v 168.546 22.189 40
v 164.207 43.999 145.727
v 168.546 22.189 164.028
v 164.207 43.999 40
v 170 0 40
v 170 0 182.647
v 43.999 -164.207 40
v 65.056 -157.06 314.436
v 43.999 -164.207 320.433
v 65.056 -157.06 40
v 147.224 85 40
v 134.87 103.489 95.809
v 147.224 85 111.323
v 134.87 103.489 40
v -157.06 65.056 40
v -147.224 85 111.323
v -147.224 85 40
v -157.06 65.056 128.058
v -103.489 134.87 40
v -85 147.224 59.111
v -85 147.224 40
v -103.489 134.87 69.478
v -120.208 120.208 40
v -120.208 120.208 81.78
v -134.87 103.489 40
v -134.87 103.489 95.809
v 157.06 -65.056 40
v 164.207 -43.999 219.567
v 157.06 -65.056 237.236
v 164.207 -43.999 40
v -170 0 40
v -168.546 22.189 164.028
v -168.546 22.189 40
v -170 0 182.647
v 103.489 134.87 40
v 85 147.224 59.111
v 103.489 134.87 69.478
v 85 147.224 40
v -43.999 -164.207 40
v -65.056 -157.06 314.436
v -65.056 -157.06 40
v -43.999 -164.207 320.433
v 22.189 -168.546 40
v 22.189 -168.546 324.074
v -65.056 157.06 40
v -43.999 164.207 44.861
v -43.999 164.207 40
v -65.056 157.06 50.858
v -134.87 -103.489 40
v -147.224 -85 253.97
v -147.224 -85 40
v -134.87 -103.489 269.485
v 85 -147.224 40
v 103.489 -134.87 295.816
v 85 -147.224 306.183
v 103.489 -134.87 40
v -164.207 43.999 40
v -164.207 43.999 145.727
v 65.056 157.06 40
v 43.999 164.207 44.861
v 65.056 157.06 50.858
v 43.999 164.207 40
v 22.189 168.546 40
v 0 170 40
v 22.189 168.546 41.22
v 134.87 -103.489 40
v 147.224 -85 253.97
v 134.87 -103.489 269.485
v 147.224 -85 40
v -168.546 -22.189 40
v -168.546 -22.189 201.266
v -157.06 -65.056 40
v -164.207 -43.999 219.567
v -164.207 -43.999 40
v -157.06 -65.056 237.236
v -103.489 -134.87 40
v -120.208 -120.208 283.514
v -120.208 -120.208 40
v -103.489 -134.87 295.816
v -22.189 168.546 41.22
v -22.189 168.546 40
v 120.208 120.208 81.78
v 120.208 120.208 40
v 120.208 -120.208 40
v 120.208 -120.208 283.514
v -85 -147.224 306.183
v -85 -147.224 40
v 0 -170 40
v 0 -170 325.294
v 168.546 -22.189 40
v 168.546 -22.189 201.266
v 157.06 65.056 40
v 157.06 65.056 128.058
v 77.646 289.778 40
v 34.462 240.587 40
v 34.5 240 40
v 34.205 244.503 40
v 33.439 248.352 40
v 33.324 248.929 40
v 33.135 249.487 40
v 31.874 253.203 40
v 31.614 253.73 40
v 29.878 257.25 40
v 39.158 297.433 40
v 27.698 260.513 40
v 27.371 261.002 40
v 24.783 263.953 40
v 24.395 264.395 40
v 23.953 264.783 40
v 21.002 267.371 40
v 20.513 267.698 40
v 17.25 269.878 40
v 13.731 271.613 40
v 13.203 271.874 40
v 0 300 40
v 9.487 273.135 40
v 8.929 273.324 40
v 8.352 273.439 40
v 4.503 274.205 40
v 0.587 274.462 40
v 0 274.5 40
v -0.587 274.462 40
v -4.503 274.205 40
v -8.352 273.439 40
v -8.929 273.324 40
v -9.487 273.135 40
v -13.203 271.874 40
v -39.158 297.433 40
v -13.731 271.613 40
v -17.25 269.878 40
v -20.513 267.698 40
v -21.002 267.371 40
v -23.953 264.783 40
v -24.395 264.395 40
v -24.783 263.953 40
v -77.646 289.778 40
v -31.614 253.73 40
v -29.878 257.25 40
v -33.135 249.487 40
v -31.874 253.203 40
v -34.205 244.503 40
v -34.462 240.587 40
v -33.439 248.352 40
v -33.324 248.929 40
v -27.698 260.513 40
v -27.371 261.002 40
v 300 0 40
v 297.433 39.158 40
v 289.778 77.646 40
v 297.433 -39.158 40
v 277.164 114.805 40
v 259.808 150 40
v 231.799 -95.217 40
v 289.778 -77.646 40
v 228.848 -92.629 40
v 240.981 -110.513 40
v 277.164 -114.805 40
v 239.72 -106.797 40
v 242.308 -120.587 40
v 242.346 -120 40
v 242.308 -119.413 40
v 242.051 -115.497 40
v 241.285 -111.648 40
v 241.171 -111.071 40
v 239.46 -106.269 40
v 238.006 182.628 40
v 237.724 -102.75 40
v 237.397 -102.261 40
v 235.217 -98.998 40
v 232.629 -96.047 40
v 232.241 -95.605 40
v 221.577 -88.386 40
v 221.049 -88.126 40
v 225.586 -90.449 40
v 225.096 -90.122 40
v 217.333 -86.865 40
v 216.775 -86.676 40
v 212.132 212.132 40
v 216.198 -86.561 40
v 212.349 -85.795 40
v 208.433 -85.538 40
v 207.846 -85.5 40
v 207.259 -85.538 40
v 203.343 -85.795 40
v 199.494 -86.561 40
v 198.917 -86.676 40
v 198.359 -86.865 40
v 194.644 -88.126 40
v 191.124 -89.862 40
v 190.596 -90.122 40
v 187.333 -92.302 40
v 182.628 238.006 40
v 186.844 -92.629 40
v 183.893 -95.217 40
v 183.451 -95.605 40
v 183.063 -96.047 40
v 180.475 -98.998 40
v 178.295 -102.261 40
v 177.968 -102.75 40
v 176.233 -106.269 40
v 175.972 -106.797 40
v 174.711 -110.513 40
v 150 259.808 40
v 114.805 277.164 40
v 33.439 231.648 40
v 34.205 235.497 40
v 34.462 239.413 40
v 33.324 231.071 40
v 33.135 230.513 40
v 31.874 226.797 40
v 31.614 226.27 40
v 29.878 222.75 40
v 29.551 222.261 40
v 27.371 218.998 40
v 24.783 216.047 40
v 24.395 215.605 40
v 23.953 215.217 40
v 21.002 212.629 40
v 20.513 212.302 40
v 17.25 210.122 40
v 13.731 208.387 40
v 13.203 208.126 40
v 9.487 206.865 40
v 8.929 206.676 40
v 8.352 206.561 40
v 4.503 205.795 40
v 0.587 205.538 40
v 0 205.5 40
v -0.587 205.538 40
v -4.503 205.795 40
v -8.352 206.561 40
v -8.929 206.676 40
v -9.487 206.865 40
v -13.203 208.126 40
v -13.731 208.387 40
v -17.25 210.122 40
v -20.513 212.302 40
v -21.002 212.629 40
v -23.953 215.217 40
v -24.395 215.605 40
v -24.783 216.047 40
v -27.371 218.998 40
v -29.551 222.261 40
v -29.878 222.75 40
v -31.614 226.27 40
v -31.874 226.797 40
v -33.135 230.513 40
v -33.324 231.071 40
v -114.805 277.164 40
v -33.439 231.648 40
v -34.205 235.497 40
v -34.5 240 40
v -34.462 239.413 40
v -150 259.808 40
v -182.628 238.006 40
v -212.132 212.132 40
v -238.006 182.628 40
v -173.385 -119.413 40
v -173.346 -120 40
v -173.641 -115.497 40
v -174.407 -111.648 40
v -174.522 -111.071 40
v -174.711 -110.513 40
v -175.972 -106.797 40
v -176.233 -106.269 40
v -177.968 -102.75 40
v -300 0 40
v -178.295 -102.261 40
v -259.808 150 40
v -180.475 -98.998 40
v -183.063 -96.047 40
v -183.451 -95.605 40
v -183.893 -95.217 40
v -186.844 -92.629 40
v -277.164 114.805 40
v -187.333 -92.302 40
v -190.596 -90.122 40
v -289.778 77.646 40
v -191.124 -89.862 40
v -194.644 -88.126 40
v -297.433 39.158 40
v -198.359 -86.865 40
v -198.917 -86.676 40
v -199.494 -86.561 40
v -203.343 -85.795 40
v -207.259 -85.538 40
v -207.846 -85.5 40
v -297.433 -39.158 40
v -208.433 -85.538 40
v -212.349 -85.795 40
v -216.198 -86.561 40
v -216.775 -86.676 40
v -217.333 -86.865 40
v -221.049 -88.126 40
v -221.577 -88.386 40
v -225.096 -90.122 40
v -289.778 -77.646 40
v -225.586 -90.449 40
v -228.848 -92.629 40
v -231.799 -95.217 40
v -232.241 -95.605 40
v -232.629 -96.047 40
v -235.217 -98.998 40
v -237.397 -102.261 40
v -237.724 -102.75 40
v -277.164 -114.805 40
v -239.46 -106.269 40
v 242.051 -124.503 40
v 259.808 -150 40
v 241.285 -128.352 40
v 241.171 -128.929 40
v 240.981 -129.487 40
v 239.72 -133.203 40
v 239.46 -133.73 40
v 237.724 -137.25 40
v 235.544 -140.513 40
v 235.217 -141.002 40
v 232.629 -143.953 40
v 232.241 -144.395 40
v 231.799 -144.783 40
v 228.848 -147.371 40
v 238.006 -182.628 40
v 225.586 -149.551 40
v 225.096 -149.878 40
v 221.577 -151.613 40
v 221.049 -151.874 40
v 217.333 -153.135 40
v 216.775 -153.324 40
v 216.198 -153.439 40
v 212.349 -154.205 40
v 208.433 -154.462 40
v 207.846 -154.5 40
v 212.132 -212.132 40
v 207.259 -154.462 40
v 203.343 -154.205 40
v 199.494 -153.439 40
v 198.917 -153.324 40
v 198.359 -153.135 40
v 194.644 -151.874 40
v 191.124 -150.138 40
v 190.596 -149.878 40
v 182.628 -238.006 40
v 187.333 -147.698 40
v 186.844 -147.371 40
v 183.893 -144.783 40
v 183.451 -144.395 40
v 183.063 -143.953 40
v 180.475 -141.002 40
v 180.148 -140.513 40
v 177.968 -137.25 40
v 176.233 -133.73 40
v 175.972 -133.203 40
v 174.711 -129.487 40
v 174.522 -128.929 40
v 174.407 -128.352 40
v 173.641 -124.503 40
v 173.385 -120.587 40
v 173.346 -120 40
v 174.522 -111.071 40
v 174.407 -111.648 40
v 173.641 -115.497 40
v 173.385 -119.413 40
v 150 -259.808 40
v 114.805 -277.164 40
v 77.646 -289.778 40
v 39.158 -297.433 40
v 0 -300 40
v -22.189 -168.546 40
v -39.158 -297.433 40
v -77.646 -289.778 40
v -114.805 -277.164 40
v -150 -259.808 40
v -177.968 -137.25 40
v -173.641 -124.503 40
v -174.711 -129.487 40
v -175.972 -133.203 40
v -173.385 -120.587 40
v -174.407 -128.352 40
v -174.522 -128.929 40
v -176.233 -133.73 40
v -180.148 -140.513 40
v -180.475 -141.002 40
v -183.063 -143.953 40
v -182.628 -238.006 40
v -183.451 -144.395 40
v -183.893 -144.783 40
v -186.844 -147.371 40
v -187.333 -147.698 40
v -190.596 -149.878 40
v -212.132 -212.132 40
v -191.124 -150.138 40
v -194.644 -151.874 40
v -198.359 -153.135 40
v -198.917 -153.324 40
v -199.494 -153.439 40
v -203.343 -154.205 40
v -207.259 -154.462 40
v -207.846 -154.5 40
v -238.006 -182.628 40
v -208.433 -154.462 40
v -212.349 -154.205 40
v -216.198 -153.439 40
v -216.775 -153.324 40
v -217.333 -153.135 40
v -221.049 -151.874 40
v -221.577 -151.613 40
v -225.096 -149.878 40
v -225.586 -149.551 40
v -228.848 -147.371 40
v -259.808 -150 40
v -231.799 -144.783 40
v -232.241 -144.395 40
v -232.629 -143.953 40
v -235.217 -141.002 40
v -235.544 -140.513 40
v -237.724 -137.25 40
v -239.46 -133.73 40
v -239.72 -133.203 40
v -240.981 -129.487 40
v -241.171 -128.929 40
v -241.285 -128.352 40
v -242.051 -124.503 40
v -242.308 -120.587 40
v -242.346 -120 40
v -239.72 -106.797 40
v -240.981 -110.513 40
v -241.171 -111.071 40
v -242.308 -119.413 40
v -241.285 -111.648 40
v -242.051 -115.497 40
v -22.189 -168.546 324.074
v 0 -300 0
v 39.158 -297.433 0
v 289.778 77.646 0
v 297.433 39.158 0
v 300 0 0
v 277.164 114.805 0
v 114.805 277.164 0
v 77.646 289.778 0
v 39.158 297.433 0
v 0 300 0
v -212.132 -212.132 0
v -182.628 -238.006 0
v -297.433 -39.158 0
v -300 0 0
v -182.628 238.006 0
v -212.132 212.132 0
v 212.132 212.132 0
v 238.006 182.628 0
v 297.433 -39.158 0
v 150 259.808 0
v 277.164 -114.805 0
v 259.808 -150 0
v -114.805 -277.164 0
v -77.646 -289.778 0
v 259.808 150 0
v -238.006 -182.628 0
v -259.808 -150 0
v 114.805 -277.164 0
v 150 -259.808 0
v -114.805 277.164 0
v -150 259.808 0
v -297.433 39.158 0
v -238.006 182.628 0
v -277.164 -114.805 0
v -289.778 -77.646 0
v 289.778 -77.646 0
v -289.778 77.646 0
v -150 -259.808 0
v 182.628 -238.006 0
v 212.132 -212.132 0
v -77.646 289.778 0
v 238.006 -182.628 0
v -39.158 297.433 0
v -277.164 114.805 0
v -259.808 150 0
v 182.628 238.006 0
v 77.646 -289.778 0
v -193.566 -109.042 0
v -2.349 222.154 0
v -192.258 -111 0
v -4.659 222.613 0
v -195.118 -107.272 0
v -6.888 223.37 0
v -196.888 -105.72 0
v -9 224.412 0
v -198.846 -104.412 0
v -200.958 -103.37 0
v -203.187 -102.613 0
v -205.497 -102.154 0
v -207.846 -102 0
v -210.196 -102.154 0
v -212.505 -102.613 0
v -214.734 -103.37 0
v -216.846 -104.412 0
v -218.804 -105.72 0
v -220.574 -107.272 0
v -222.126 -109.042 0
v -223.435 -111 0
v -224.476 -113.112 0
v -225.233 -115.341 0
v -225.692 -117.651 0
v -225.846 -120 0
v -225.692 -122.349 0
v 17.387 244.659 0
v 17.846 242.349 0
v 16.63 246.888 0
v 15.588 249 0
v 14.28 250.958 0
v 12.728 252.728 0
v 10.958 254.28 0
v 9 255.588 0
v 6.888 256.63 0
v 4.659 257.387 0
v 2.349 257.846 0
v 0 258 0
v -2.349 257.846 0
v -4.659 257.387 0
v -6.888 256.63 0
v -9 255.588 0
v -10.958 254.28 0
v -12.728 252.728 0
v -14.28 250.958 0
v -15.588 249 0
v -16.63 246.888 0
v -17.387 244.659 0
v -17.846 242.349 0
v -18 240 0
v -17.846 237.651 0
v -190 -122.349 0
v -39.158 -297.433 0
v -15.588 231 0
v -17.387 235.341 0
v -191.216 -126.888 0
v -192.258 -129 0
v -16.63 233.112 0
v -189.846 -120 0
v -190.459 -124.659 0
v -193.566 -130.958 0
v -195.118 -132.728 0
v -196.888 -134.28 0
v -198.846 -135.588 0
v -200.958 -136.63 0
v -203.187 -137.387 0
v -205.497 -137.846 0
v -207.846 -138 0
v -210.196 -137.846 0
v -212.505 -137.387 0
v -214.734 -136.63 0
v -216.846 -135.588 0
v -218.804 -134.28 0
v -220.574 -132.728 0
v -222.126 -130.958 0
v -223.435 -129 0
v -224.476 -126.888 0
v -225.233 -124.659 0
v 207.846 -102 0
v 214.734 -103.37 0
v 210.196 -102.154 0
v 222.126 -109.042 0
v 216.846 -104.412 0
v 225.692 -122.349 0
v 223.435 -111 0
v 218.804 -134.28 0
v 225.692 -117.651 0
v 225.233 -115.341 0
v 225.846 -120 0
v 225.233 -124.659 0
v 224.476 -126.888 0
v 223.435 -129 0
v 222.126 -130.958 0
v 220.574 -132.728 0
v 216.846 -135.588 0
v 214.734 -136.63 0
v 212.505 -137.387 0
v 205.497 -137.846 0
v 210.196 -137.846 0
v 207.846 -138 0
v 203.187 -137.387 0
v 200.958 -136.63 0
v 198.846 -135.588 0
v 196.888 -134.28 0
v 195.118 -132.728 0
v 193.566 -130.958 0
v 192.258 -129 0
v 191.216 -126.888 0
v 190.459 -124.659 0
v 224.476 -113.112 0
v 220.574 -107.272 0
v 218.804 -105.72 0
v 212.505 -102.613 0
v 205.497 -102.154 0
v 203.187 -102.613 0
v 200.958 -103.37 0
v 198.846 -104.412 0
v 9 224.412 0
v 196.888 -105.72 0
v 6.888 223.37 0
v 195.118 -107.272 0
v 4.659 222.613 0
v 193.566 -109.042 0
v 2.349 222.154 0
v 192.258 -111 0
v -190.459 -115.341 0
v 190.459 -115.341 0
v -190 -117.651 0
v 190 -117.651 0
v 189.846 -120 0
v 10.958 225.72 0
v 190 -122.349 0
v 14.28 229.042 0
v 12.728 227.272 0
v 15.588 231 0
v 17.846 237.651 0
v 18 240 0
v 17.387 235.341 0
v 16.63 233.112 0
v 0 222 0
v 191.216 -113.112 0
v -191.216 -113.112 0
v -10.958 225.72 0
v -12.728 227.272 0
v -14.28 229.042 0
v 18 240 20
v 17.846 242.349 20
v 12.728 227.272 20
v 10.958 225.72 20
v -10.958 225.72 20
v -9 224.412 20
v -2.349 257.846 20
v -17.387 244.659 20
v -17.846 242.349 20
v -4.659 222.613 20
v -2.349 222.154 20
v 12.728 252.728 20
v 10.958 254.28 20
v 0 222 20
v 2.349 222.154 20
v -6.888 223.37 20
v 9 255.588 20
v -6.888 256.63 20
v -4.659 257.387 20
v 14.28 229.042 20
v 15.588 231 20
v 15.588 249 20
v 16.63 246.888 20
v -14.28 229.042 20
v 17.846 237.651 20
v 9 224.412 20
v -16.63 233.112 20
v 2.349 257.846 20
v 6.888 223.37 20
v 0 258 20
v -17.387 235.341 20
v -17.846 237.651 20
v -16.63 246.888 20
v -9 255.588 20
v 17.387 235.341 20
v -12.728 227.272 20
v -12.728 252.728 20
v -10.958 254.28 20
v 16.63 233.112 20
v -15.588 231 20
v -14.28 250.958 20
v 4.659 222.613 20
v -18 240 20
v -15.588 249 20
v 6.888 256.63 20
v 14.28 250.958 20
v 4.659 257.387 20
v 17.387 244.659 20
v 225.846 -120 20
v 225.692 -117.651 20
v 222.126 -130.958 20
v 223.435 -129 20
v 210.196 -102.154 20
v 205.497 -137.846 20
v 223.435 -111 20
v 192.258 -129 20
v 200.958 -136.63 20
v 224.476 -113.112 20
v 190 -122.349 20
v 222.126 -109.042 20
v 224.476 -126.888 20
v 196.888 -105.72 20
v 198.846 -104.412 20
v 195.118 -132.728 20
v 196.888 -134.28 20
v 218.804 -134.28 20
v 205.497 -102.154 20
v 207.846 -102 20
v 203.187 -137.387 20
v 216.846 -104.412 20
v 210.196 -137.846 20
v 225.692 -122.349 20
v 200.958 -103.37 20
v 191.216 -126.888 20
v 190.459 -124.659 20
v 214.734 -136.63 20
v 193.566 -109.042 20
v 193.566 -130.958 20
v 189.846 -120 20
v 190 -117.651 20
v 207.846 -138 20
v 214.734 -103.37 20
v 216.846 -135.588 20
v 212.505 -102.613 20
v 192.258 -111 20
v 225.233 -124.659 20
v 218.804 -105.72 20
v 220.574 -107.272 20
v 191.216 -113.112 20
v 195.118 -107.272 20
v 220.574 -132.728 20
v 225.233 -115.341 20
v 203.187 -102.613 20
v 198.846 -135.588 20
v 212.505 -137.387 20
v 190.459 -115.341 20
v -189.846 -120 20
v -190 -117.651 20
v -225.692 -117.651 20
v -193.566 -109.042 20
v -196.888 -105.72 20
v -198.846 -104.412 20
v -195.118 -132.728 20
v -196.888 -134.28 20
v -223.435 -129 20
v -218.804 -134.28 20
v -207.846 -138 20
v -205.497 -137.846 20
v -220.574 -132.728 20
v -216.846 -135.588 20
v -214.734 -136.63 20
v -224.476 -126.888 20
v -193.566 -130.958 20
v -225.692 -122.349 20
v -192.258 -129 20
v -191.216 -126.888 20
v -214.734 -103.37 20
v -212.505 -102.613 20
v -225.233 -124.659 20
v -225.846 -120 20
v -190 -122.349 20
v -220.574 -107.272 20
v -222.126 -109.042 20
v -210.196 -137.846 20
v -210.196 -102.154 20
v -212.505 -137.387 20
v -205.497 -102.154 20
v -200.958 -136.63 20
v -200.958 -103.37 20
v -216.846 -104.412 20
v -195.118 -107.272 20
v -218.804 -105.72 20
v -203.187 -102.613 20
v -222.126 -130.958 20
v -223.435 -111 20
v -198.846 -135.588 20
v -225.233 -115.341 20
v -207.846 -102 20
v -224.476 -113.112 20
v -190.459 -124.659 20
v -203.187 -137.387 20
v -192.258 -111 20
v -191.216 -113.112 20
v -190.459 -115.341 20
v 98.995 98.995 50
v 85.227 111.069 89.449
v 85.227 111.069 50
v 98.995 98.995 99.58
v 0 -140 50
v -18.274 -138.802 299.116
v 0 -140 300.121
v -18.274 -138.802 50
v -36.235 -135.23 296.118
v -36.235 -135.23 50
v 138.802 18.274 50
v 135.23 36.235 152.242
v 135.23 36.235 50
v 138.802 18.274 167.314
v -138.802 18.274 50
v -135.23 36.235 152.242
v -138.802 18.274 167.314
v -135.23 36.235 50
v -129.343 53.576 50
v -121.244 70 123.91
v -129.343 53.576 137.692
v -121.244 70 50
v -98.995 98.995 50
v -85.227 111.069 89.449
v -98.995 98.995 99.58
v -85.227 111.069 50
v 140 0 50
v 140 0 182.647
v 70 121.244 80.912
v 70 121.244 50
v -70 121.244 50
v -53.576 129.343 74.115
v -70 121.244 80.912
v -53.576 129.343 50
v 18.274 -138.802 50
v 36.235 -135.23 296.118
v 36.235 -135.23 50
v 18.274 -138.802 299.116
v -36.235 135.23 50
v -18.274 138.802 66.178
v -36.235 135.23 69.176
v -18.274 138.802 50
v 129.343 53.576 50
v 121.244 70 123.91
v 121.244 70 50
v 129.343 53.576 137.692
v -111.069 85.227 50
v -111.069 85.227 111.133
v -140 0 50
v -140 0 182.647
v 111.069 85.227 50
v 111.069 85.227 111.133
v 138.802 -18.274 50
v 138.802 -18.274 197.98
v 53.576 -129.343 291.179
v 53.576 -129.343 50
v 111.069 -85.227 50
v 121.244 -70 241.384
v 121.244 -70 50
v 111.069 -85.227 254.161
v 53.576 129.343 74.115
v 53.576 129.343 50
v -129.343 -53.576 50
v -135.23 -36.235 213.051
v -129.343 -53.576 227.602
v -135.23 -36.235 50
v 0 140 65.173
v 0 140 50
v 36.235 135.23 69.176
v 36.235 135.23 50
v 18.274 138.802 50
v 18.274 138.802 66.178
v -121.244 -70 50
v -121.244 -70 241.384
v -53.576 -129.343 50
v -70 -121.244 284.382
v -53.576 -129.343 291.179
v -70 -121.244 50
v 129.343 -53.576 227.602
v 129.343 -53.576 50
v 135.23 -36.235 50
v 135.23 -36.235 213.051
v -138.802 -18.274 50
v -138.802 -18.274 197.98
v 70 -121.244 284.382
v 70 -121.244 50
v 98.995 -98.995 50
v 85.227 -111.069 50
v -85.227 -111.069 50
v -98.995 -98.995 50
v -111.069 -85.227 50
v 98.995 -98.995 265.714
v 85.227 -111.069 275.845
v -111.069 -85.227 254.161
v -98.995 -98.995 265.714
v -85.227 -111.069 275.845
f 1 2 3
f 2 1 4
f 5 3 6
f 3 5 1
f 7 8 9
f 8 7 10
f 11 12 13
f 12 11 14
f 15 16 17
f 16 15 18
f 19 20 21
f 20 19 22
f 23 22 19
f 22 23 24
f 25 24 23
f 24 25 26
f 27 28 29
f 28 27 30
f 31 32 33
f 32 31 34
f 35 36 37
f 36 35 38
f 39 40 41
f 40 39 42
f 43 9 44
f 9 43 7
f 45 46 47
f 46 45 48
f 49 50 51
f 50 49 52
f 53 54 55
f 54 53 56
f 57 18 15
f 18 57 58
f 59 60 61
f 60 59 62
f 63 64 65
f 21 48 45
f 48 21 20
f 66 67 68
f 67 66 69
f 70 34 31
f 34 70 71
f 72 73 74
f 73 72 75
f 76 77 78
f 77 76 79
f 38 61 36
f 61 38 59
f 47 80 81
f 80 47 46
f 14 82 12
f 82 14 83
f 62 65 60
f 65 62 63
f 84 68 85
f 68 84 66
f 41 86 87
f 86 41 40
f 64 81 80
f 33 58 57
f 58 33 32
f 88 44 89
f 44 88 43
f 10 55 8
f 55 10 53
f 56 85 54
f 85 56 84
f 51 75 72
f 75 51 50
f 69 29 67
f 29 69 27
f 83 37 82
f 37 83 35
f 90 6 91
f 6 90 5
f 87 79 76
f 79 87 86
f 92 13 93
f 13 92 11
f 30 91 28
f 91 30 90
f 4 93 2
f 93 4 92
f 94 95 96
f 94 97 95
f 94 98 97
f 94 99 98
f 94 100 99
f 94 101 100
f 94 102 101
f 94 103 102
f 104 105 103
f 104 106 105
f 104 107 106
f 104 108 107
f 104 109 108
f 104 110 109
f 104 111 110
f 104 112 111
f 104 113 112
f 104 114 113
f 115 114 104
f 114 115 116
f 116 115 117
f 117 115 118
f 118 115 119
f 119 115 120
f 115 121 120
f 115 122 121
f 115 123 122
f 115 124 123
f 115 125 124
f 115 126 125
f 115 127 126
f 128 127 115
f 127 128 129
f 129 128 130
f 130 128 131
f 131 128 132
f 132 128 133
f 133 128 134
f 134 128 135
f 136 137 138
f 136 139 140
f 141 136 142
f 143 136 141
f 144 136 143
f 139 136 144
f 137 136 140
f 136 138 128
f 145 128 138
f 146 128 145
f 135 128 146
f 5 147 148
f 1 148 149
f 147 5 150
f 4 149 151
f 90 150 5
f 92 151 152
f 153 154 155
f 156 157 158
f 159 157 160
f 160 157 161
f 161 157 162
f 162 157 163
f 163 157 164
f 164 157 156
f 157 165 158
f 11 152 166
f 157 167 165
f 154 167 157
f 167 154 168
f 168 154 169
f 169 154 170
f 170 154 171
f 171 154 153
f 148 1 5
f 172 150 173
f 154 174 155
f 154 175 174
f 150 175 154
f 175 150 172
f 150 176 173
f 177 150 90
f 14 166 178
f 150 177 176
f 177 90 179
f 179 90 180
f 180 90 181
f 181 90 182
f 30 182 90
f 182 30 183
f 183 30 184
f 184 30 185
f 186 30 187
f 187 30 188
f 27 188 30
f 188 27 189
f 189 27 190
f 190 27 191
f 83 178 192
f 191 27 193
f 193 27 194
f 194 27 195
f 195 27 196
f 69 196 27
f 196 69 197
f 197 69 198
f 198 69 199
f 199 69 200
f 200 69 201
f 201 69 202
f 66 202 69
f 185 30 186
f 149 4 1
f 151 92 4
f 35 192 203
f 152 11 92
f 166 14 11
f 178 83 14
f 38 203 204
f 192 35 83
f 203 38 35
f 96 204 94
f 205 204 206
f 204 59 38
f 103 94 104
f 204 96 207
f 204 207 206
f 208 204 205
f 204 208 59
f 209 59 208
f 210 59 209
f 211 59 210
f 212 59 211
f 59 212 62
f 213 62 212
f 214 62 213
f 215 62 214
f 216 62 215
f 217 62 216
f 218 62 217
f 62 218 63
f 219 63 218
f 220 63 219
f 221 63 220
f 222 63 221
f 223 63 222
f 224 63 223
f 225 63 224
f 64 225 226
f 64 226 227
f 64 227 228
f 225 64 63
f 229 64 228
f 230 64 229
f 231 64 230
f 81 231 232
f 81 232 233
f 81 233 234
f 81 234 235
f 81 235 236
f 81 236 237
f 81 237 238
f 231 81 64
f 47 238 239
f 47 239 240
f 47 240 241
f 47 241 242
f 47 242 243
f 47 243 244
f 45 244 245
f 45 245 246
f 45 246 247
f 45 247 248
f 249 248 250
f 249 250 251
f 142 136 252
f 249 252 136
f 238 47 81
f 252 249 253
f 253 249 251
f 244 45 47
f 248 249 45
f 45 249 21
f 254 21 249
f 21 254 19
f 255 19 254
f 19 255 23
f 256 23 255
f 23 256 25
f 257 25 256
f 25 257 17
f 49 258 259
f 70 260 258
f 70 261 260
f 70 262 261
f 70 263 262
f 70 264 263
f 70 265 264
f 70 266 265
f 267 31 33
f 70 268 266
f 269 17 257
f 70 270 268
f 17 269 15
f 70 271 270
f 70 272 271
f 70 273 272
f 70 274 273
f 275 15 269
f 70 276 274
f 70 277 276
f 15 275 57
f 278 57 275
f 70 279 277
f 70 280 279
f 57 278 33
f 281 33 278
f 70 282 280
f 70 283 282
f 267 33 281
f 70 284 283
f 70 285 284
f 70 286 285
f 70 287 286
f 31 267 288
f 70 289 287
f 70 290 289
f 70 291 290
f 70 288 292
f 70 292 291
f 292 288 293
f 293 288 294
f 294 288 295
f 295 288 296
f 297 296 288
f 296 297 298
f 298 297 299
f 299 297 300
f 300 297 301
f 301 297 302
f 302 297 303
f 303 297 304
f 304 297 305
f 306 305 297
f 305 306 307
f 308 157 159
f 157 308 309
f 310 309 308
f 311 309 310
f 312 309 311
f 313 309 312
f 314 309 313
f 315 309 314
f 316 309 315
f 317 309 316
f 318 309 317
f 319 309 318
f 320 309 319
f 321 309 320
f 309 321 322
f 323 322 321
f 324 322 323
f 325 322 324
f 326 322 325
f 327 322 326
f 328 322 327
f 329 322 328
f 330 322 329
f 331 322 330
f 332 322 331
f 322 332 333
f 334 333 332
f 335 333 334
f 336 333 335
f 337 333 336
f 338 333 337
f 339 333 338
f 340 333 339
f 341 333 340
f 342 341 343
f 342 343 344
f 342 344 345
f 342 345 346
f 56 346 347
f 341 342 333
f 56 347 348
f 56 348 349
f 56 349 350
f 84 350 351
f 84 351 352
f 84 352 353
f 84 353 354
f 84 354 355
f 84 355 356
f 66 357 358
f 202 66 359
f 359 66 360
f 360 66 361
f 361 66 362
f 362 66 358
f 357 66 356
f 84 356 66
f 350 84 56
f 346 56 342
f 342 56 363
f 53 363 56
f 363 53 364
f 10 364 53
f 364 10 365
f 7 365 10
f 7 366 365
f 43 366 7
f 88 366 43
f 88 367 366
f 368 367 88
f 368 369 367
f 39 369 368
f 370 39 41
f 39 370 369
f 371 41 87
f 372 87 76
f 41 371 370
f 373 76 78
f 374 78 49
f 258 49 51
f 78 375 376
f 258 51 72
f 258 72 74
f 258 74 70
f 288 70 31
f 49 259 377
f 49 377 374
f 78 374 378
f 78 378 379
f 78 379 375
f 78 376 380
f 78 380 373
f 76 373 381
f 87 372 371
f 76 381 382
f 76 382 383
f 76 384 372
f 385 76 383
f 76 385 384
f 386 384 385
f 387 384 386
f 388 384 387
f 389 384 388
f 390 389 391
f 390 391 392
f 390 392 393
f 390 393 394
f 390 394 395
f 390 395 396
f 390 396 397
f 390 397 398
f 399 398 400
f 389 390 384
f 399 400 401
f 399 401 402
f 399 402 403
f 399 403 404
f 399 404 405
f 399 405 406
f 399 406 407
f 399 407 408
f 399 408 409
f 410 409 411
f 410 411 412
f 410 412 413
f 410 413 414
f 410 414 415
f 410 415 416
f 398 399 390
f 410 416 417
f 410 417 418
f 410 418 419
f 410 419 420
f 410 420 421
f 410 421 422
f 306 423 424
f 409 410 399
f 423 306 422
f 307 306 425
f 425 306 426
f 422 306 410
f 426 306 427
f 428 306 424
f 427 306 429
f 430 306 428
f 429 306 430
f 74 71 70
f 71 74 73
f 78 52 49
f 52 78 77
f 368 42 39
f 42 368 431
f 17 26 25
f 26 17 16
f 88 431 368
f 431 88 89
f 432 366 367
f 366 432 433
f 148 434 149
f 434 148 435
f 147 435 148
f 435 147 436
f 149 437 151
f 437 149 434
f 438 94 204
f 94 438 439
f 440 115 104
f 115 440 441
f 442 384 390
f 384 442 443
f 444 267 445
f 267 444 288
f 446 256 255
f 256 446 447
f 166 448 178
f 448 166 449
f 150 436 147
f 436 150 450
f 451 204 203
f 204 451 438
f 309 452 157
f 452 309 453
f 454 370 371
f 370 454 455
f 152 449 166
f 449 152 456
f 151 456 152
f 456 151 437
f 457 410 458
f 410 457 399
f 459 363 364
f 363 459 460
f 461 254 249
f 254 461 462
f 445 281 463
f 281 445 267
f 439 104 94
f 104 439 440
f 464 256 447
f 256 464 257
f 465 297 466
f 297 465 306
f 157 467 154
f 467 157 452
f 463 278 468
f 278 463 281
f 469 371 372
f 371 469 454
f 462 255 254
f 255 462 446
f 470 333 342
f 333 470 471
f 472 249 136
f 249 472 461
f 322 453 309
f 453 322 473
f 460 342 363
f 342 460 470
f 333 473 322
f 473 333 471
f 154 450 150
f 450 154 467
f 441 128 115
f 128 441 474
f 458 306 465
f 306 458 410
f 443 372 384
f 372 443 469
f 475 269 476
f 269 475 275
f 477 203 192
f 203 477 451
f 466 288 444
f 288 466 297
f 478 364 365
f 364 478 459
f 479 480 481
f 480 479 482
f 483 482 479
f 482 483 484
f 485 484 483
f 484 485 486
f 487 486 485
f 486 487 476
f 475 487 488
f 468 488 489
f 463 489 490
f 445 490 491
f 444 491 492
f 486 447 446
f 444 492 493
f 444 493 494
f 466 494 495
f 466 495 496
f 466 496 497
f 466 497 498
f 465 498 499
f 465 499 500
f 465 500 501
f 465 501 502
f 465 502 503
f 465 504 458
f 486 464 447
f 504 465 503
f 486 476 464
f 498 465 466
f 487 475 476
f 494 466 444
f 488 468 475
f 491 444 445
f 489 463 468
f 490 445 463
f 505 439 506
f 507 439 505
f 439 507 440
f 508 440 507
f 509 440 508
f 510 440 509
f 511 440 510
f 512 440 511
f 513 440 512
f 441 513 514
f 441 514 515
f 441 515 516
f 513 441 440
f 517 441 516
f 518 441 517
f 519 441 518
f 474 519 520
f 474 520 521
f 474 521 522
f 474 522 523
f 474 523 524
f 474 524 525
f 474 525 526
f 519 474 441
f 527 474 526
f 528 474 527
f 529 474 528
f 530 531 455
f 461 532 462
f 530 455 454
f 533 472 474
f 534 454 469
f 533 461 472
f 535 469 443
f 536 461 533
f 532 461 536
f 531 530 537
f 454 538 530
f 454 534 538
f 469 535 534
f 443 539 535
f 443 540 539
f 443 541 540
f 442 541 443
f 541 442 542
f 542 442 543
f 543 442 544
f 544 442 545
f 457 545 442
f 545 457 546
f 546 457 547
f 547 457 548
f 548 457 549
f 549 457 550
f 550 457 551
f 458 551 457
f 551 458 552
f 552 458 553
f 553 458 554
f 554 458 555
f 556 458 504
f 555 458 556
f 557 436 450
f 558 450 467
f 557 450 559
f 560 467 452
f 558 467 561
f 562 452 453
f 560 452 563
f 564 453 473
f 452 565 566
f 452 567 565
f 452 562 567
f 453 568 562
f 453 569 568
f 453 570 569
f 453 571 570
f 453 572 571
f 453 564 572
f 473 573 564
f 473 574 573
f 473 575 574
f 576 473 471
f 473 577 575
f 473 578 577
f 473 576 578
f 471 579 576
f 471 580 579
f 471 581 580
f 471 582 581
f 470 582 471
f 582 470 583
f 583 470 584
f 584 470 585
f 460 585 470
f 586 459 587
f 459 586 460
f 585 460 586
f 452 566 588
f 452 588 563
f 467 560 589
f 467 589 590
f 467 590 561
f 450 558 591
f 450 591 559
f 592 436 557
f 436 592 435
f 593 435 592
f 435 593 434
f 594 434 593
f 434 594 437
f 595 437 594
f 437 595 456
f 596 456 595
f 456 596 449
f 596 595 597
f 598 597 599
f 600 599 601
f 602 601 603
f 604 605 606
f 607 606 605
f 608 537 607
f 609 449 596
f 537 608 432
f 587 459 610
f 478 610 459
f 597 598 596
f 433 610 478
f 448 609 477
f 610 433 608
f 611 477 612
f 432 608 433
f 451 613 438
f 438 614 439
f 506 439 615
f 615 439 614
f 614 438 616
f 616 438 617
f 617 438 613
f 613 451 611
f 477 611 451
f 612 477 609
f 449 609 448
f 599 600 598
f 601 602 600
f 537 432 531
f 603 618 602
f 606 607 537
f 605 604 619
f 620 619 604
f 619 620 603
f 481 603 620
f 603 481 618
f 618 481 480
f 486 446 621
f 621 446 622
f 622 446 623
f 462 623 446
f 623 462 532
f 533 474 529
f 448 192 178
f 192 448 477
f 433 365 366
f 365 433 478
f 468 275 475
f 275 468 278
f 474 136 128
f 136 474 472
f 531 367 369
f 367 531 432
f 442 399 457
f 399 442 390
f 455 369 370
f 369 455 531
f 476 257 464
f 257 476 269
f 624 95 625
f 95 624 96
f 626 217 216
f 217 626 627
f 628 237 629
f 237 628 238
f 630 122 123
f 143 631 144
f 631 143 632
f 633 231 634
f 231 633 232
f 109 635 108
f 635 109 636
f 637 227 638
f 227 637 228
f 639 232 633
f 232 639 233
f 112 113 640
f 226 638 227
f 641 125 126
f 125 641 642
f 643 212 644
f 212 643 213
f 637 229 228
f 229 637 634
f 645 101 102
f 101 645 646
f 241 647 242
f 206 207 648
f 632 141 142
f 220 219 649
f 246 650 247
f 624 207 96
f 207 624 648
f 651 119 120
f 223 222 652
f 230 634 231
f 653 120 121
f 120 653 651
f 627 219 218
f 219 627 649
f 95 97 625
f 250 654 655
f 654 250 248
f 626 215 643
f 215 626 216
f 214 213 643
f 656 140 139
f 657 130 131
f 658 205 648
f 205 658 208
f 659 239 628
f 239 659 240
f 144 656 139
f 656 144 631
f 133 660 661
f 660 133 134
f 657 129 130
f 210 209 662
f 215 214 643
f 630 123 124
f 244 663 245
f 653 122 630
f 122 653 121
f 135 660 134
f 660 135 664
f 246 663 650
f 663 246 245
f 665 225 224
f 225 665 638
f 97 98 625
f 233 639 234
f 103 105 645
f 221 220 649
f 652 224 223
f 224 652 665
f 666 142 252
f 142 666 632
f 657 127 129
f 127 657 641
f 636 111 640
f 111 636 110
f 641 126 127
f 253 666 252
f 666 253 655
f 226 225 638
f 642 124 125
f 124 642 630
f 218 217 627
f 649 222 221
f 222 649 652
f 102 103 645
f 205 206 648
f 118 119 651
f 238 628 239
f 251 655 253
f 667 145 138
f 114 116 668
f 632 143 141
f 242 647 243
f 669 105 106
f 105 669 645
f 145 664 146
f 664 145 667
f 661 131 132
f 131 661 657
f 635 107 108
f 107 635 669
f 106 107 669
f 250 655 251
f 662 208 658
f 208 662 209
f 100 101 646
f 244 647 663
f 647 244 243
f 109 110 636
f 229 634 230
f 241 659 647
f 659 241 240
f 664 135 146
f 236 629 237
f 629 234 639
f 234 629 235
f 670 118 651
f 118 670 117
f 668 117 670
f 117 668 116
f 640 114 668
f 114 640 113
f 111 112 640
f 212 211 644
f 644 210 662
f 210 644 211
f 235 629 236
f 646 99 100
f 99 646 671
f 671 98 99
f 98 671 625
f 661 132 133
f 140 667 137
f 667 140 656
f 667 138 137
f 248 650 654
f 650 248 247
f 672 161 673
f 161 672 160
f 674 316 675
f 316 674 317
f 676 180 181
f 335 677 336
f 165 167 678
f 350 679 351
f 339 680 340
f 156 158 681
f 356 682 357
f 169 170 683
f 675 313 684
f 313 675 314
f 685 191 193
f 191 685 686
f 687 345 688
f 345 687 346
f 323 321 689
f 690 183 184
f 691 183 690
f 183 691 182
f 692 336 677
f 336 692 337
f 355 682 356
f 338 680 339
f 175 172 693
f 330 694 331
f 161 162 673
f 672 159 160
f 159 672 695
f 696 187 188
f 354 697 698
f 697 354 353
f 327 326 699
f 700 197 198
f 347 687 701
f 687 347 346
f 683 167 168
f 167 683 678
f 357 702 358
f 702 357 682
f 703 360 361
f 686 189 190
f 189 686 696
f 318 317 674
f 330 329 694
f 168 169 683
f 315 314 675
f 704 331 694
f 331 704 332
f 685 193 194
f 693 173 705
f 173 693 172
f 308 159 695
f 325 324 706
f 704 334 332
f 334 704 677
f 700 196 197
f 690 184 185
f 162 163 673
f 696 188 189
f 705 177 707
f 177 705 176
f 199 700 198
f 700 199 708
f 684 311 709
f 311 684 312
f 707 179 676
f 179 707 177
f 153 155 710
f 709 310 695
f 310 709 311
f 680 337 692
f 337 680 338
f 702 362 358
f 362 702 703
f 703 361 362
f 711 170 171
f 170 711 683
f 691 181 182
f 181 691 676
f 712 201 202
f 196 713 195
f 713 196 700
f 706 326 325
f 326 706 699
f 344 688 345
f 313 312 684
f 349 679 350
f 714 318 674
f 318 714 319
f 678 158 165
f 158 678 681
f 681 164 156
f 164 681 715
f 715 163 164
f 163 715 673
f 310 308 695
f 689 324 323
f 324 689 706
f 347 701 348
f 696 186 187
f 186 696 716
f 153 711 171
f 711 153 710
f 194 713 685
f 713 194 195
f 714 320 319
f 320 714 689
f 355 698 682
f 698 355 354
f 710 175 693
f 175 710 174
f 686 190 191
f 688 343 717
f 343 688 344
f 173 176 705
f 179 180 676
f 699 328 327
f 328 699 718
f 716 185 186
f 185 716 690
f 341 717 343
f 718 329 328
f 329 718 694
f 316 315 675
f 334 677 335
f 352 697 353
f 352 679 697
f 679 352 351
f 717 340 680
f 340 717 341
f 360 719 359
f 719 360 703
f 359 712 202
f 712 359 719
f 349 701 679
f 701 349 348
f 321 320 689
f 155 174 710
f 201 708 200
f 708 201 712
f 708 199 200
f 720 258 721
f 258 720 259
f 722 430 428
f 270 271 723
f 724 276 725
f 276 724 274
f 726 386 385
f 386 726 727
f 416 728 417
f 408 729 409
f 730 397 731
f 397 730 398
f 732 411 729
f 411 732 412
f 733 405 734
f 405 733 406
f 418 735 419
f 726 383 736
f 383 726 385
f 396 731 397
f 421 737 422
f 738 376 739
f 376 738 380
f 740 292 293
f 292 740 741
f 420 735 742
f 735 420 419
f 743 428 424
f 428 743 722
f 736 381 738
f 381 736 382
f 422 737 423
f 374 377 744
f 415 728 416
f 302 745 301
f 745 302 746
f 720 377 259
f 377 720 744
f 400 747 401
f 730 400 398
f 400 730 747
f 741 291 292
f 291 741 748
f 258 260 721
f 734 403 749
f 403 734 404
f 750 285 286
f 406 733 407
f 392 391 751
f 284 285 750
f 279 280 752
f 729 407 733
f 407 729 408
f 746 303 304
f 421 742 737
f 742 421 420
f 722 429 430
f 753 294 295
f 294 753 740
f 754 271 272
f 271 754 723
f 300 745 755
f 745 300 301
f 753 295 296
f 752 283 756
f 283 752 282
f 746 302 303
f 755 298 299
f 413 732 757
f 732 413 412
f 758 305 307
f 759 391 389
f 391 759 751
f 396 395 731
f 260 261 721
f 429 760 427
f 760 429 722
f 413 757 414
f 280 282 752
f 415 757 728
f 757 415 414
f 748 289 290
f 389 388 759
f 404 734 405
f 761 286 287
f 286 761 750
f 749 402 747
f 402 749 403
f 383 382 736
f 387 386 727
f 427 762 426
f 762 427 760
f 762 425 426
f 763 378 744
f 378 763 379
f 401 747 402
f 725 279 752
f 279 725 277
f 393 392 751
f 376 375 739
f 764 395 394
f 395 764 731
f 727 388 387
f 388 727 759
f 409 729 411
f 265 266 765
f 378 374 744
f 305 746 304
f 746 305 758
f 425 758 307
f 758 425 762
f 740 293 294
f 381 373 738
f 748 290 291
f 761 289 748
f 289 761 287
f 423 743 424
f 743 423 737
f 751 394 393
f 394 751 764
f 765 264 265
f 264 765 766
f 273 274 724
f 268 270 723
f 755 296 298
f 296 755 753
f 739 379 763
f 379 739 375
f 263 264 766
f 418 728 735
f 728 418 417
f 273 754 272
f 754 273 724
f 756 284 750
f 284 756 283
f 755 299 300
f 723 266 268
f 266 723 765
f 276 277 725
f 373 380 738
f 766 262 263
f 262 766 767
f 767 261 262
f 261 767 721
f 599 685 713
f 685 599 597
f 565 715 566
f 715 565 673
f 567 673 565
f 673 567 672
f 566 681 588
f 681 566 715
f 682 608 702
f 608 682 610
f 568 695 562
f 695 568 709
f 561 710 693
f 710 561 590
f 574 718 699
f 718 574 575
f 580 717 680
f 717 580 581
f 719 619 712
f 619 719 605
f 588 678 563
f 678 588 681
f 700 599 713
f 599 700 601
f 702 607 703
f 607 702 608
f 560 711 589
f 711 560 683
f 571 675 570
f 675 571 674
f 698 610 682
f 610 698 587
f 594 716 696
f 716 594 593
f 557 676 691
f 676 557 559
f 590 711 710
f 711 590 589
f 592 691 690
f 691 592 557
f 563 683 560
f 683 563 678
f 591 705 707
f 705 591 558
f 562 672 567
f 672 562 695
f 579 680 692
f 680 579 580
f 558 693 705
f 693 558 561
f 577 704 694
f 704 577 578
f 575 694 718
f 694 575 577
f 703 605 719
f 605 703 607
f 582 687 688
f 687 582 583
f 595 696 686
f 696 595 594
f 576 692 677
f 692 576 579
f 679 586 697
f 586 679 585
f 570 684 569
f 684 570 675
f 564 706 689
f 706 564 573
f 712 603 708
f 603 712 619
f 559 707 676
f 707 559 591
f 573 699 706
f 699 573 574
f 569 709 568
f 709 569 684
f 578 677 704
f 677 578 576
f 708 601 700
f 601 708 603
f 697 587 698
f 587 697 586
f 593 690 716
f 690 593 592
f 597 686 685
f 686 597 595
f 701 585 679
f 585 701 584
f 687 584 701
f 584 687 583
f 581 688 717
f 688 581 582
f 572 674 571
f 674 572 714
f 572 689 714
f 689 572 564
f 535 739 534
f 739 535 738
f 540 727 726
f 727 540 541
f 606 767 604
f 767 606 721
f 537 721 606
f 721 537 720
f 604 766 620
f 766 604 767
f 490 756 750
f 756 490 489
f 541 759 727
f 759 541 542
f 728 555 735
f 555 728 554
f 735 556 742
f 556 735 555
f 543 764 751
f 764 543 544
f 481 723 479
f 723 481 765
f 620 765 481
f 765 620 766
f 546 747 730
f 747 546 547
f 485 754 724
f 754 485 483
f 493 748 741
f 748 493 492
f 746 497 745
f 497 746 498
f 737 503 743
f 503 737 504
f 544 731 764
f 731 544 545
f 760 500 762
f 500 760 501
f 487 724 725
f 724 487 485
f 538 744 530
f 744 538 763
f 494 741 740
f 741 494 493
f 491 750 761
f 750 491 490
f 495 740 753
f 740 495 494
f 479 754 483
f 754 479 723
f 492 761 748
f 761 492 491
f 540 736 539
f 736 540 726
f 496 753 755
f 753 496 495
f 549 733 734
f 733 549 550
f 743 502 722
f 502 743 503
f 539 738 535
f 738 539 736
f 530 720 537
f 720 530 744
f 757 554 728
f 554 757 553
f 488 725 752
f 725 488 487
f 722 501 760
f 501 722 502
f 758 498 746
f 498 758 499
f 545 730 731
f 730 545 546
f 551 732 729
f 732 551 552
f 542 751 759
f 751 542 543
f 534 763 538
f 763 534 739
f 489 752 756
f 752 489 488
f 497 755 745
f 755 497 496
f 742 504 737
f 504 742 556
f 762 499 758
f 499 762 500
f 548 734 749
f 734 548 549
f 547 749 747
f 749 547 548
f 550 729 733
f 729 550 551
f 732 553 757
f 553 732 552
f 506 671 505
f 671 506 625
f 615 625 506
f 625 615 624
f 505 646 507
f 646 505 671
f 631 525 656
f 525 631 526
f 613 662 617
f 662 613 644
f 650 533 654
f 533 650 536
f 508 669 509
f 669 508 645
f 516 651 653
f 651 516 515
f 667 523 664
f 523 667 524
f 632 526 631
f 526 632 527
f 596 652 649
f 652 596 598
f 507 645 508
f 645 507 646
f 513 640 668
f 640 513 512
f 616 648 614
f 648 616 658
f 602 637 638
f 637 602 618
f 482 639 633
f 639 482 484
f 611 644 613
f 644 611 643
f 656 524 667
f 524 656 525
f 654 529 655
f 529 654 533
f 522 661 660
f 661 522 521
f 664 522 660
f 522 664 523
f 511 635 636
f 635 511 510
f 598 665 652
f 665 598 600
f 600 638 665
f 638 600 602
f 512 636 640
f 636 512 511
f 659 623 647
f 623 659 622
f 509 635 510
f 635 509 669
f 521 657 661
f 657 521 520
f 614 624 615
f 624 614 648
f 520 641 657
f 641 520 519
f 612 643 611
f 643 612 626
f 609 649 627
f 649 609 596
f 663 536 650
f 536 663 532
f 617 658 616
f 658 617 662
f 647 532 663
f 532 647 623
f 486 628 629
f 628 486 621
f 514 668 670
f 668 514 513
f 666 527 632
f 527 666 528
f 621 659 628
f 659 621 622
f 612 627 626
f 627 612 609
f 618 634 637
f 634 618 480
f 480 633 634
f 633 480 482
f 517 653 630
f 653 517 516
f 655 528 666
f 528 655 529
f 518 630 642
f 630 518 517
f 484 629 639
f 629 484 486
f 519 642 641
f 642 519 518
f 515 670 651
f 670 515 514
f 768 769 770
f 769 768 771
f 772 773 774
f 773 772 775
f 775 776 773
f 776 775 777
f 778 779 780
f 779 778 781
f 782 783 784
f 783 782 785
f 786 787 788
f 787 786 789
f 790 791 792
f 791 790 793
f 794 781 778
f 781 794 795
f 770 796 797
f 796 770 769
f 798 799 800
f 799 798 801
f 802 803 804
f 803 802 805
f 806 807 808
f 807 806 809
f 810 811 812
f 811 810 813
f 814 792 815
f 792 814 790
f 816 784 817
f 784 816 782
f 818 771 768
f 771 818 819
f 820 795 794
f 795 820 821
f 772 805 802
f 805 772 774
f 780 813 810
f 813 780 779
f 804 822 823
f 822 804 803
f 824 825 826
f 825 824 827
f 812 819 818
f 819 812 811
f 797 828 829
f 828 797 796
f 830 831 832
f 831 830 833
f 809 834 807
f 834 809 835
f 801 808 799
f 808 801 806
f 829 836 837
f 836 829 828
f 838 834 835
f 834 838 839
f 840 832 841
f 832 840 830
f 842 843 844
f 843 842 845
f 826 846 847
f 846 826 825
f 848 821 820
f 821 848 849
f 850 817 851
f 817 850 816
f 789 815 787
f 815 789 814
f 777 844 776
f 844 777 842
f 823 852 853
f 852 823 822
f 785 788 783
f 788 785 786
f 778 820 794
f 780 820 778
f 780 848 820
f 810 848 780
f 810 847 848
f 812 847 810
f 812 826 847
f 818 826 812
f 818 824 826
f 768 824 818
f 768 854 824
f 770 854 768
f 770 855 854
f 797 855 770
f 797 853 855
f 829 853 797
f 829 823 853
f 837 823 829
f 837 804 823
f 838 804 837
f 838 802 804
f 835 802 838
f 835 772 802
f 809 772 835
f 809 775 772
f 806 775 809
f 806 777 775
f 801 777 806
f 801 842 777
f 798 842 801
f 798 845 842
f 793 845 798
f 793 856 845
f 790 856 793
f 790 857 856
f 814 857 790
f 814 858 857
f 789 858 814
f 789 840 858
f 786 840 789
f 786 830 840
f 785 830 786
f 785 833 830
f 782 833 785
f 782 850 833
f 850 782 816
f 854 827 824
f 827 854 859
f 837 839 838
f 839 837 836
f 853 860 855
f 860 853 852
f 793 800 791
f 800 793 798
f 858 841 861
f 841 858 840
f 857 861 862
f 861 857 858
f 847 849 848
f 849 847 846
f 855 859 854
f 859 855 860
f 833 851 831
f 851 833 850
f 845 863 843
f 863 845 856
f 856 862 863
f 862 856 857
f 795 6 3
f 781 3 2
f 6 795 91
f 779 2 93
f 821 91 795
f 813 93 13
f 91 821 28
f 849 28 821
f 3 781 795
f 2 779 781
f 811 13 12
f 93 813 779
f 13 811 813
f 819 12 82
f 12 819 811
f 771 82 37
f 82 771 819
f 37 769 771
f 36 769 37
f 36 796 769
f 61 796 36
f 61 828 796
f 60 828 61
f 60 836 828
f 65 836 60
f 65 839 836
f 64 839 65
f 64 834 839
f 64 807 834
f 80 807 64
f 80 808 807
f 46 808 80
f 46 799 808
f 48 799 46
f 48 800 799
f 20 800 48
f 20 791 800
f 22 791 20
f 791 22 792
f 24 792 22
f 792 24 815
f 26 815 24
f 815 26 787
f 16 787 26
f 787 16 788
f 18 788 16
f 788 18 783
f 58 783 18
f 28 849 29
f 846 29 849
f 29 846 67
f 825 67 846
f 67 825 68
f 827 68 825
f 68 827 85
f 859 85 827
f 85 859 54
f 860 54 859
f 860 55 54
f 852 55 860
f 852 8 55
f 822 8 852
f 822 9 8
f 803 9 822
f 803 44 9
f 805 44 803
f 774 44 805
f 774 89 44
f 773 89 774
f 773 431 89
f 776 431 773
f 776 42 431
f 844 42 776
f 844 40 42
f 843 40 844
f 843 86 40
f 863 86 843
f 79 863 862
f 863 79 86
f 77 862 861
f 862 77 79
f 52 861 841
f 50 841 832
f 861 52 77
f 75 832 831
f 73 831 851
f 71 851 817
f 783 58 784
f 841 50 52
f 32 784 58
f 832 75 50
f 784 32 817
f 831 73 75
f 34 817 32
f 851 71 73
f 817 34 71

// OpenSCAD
//custermizing data

//screw taper hole r
sth=40;

//screw hole r
shr=18;

//number of screws
ns =3;  //[2,3,4]

//inner_diameter
ind=280;

//outer diameter
od=340;


//fringe thickness
fth=40;

//cylinder hight
ch=340;

//taper depth
tdp=fth*2/3;

// screw hole offset
off= 360/ns;

//fringe diameter
fd=600;

//Angle yes/no
ang="yes";//[yes,no]


//custermizing data end

//ignore variable
$fn=48*1;

module pipeholder()
{
	translate([0, 0, 0]) {
		difference() {
                union(){                                                      //cylinder & fringe
		  translate([0, 0, fth]) cylinder(h = ch-fth, r =od/2);               //cylinder
          translate([0, 0, 00])cylinder(h = fth, r= fd/2); //fringe
                       }
		for (i = [0:(ns-1)]) { 		                                        //screw taper hole
			echo(360*i/ns, sin(360*i/ns)*(od/2+70), cos(360*i/ns)*(od/2+70));
			translate([sin(360*i/ns)*(od/2+70), cos(360*i/ns)*(od/2+70), fth/2])
				cylinder(h =tdp, r2=sth,r1=shr);
		                      }
		translate([0, 0, 50])                                                 // shaft 
			cylinder(h = ch-fth+25, r=ind/2);
		       for (i = [0:(ns-1)]) {                                         // screw hole
			echo(360*i/ns+off, sin(360*i/ns+off)*(od/2+70), cos(360*i/ns+off)*(od/2+70));
			translate([sin(360*i/ns+off)*(od/2+70), cos(360*i/ns+off)*(od/2+70), -1 ])
				cylinder(h=(fth-tdp)+20,r=shr);
		                             }
                     }
                              }
}

if (ang=="no"){
pipeholder();
				}
if (ang=="yes"){
			difference(){ pipeholder();
							translate([od/2,od/2,fth])rotate([atan(ch/od)-5,0,180]) cube( size=[od,1.6*ch,ch],center=false);
						}
				}
